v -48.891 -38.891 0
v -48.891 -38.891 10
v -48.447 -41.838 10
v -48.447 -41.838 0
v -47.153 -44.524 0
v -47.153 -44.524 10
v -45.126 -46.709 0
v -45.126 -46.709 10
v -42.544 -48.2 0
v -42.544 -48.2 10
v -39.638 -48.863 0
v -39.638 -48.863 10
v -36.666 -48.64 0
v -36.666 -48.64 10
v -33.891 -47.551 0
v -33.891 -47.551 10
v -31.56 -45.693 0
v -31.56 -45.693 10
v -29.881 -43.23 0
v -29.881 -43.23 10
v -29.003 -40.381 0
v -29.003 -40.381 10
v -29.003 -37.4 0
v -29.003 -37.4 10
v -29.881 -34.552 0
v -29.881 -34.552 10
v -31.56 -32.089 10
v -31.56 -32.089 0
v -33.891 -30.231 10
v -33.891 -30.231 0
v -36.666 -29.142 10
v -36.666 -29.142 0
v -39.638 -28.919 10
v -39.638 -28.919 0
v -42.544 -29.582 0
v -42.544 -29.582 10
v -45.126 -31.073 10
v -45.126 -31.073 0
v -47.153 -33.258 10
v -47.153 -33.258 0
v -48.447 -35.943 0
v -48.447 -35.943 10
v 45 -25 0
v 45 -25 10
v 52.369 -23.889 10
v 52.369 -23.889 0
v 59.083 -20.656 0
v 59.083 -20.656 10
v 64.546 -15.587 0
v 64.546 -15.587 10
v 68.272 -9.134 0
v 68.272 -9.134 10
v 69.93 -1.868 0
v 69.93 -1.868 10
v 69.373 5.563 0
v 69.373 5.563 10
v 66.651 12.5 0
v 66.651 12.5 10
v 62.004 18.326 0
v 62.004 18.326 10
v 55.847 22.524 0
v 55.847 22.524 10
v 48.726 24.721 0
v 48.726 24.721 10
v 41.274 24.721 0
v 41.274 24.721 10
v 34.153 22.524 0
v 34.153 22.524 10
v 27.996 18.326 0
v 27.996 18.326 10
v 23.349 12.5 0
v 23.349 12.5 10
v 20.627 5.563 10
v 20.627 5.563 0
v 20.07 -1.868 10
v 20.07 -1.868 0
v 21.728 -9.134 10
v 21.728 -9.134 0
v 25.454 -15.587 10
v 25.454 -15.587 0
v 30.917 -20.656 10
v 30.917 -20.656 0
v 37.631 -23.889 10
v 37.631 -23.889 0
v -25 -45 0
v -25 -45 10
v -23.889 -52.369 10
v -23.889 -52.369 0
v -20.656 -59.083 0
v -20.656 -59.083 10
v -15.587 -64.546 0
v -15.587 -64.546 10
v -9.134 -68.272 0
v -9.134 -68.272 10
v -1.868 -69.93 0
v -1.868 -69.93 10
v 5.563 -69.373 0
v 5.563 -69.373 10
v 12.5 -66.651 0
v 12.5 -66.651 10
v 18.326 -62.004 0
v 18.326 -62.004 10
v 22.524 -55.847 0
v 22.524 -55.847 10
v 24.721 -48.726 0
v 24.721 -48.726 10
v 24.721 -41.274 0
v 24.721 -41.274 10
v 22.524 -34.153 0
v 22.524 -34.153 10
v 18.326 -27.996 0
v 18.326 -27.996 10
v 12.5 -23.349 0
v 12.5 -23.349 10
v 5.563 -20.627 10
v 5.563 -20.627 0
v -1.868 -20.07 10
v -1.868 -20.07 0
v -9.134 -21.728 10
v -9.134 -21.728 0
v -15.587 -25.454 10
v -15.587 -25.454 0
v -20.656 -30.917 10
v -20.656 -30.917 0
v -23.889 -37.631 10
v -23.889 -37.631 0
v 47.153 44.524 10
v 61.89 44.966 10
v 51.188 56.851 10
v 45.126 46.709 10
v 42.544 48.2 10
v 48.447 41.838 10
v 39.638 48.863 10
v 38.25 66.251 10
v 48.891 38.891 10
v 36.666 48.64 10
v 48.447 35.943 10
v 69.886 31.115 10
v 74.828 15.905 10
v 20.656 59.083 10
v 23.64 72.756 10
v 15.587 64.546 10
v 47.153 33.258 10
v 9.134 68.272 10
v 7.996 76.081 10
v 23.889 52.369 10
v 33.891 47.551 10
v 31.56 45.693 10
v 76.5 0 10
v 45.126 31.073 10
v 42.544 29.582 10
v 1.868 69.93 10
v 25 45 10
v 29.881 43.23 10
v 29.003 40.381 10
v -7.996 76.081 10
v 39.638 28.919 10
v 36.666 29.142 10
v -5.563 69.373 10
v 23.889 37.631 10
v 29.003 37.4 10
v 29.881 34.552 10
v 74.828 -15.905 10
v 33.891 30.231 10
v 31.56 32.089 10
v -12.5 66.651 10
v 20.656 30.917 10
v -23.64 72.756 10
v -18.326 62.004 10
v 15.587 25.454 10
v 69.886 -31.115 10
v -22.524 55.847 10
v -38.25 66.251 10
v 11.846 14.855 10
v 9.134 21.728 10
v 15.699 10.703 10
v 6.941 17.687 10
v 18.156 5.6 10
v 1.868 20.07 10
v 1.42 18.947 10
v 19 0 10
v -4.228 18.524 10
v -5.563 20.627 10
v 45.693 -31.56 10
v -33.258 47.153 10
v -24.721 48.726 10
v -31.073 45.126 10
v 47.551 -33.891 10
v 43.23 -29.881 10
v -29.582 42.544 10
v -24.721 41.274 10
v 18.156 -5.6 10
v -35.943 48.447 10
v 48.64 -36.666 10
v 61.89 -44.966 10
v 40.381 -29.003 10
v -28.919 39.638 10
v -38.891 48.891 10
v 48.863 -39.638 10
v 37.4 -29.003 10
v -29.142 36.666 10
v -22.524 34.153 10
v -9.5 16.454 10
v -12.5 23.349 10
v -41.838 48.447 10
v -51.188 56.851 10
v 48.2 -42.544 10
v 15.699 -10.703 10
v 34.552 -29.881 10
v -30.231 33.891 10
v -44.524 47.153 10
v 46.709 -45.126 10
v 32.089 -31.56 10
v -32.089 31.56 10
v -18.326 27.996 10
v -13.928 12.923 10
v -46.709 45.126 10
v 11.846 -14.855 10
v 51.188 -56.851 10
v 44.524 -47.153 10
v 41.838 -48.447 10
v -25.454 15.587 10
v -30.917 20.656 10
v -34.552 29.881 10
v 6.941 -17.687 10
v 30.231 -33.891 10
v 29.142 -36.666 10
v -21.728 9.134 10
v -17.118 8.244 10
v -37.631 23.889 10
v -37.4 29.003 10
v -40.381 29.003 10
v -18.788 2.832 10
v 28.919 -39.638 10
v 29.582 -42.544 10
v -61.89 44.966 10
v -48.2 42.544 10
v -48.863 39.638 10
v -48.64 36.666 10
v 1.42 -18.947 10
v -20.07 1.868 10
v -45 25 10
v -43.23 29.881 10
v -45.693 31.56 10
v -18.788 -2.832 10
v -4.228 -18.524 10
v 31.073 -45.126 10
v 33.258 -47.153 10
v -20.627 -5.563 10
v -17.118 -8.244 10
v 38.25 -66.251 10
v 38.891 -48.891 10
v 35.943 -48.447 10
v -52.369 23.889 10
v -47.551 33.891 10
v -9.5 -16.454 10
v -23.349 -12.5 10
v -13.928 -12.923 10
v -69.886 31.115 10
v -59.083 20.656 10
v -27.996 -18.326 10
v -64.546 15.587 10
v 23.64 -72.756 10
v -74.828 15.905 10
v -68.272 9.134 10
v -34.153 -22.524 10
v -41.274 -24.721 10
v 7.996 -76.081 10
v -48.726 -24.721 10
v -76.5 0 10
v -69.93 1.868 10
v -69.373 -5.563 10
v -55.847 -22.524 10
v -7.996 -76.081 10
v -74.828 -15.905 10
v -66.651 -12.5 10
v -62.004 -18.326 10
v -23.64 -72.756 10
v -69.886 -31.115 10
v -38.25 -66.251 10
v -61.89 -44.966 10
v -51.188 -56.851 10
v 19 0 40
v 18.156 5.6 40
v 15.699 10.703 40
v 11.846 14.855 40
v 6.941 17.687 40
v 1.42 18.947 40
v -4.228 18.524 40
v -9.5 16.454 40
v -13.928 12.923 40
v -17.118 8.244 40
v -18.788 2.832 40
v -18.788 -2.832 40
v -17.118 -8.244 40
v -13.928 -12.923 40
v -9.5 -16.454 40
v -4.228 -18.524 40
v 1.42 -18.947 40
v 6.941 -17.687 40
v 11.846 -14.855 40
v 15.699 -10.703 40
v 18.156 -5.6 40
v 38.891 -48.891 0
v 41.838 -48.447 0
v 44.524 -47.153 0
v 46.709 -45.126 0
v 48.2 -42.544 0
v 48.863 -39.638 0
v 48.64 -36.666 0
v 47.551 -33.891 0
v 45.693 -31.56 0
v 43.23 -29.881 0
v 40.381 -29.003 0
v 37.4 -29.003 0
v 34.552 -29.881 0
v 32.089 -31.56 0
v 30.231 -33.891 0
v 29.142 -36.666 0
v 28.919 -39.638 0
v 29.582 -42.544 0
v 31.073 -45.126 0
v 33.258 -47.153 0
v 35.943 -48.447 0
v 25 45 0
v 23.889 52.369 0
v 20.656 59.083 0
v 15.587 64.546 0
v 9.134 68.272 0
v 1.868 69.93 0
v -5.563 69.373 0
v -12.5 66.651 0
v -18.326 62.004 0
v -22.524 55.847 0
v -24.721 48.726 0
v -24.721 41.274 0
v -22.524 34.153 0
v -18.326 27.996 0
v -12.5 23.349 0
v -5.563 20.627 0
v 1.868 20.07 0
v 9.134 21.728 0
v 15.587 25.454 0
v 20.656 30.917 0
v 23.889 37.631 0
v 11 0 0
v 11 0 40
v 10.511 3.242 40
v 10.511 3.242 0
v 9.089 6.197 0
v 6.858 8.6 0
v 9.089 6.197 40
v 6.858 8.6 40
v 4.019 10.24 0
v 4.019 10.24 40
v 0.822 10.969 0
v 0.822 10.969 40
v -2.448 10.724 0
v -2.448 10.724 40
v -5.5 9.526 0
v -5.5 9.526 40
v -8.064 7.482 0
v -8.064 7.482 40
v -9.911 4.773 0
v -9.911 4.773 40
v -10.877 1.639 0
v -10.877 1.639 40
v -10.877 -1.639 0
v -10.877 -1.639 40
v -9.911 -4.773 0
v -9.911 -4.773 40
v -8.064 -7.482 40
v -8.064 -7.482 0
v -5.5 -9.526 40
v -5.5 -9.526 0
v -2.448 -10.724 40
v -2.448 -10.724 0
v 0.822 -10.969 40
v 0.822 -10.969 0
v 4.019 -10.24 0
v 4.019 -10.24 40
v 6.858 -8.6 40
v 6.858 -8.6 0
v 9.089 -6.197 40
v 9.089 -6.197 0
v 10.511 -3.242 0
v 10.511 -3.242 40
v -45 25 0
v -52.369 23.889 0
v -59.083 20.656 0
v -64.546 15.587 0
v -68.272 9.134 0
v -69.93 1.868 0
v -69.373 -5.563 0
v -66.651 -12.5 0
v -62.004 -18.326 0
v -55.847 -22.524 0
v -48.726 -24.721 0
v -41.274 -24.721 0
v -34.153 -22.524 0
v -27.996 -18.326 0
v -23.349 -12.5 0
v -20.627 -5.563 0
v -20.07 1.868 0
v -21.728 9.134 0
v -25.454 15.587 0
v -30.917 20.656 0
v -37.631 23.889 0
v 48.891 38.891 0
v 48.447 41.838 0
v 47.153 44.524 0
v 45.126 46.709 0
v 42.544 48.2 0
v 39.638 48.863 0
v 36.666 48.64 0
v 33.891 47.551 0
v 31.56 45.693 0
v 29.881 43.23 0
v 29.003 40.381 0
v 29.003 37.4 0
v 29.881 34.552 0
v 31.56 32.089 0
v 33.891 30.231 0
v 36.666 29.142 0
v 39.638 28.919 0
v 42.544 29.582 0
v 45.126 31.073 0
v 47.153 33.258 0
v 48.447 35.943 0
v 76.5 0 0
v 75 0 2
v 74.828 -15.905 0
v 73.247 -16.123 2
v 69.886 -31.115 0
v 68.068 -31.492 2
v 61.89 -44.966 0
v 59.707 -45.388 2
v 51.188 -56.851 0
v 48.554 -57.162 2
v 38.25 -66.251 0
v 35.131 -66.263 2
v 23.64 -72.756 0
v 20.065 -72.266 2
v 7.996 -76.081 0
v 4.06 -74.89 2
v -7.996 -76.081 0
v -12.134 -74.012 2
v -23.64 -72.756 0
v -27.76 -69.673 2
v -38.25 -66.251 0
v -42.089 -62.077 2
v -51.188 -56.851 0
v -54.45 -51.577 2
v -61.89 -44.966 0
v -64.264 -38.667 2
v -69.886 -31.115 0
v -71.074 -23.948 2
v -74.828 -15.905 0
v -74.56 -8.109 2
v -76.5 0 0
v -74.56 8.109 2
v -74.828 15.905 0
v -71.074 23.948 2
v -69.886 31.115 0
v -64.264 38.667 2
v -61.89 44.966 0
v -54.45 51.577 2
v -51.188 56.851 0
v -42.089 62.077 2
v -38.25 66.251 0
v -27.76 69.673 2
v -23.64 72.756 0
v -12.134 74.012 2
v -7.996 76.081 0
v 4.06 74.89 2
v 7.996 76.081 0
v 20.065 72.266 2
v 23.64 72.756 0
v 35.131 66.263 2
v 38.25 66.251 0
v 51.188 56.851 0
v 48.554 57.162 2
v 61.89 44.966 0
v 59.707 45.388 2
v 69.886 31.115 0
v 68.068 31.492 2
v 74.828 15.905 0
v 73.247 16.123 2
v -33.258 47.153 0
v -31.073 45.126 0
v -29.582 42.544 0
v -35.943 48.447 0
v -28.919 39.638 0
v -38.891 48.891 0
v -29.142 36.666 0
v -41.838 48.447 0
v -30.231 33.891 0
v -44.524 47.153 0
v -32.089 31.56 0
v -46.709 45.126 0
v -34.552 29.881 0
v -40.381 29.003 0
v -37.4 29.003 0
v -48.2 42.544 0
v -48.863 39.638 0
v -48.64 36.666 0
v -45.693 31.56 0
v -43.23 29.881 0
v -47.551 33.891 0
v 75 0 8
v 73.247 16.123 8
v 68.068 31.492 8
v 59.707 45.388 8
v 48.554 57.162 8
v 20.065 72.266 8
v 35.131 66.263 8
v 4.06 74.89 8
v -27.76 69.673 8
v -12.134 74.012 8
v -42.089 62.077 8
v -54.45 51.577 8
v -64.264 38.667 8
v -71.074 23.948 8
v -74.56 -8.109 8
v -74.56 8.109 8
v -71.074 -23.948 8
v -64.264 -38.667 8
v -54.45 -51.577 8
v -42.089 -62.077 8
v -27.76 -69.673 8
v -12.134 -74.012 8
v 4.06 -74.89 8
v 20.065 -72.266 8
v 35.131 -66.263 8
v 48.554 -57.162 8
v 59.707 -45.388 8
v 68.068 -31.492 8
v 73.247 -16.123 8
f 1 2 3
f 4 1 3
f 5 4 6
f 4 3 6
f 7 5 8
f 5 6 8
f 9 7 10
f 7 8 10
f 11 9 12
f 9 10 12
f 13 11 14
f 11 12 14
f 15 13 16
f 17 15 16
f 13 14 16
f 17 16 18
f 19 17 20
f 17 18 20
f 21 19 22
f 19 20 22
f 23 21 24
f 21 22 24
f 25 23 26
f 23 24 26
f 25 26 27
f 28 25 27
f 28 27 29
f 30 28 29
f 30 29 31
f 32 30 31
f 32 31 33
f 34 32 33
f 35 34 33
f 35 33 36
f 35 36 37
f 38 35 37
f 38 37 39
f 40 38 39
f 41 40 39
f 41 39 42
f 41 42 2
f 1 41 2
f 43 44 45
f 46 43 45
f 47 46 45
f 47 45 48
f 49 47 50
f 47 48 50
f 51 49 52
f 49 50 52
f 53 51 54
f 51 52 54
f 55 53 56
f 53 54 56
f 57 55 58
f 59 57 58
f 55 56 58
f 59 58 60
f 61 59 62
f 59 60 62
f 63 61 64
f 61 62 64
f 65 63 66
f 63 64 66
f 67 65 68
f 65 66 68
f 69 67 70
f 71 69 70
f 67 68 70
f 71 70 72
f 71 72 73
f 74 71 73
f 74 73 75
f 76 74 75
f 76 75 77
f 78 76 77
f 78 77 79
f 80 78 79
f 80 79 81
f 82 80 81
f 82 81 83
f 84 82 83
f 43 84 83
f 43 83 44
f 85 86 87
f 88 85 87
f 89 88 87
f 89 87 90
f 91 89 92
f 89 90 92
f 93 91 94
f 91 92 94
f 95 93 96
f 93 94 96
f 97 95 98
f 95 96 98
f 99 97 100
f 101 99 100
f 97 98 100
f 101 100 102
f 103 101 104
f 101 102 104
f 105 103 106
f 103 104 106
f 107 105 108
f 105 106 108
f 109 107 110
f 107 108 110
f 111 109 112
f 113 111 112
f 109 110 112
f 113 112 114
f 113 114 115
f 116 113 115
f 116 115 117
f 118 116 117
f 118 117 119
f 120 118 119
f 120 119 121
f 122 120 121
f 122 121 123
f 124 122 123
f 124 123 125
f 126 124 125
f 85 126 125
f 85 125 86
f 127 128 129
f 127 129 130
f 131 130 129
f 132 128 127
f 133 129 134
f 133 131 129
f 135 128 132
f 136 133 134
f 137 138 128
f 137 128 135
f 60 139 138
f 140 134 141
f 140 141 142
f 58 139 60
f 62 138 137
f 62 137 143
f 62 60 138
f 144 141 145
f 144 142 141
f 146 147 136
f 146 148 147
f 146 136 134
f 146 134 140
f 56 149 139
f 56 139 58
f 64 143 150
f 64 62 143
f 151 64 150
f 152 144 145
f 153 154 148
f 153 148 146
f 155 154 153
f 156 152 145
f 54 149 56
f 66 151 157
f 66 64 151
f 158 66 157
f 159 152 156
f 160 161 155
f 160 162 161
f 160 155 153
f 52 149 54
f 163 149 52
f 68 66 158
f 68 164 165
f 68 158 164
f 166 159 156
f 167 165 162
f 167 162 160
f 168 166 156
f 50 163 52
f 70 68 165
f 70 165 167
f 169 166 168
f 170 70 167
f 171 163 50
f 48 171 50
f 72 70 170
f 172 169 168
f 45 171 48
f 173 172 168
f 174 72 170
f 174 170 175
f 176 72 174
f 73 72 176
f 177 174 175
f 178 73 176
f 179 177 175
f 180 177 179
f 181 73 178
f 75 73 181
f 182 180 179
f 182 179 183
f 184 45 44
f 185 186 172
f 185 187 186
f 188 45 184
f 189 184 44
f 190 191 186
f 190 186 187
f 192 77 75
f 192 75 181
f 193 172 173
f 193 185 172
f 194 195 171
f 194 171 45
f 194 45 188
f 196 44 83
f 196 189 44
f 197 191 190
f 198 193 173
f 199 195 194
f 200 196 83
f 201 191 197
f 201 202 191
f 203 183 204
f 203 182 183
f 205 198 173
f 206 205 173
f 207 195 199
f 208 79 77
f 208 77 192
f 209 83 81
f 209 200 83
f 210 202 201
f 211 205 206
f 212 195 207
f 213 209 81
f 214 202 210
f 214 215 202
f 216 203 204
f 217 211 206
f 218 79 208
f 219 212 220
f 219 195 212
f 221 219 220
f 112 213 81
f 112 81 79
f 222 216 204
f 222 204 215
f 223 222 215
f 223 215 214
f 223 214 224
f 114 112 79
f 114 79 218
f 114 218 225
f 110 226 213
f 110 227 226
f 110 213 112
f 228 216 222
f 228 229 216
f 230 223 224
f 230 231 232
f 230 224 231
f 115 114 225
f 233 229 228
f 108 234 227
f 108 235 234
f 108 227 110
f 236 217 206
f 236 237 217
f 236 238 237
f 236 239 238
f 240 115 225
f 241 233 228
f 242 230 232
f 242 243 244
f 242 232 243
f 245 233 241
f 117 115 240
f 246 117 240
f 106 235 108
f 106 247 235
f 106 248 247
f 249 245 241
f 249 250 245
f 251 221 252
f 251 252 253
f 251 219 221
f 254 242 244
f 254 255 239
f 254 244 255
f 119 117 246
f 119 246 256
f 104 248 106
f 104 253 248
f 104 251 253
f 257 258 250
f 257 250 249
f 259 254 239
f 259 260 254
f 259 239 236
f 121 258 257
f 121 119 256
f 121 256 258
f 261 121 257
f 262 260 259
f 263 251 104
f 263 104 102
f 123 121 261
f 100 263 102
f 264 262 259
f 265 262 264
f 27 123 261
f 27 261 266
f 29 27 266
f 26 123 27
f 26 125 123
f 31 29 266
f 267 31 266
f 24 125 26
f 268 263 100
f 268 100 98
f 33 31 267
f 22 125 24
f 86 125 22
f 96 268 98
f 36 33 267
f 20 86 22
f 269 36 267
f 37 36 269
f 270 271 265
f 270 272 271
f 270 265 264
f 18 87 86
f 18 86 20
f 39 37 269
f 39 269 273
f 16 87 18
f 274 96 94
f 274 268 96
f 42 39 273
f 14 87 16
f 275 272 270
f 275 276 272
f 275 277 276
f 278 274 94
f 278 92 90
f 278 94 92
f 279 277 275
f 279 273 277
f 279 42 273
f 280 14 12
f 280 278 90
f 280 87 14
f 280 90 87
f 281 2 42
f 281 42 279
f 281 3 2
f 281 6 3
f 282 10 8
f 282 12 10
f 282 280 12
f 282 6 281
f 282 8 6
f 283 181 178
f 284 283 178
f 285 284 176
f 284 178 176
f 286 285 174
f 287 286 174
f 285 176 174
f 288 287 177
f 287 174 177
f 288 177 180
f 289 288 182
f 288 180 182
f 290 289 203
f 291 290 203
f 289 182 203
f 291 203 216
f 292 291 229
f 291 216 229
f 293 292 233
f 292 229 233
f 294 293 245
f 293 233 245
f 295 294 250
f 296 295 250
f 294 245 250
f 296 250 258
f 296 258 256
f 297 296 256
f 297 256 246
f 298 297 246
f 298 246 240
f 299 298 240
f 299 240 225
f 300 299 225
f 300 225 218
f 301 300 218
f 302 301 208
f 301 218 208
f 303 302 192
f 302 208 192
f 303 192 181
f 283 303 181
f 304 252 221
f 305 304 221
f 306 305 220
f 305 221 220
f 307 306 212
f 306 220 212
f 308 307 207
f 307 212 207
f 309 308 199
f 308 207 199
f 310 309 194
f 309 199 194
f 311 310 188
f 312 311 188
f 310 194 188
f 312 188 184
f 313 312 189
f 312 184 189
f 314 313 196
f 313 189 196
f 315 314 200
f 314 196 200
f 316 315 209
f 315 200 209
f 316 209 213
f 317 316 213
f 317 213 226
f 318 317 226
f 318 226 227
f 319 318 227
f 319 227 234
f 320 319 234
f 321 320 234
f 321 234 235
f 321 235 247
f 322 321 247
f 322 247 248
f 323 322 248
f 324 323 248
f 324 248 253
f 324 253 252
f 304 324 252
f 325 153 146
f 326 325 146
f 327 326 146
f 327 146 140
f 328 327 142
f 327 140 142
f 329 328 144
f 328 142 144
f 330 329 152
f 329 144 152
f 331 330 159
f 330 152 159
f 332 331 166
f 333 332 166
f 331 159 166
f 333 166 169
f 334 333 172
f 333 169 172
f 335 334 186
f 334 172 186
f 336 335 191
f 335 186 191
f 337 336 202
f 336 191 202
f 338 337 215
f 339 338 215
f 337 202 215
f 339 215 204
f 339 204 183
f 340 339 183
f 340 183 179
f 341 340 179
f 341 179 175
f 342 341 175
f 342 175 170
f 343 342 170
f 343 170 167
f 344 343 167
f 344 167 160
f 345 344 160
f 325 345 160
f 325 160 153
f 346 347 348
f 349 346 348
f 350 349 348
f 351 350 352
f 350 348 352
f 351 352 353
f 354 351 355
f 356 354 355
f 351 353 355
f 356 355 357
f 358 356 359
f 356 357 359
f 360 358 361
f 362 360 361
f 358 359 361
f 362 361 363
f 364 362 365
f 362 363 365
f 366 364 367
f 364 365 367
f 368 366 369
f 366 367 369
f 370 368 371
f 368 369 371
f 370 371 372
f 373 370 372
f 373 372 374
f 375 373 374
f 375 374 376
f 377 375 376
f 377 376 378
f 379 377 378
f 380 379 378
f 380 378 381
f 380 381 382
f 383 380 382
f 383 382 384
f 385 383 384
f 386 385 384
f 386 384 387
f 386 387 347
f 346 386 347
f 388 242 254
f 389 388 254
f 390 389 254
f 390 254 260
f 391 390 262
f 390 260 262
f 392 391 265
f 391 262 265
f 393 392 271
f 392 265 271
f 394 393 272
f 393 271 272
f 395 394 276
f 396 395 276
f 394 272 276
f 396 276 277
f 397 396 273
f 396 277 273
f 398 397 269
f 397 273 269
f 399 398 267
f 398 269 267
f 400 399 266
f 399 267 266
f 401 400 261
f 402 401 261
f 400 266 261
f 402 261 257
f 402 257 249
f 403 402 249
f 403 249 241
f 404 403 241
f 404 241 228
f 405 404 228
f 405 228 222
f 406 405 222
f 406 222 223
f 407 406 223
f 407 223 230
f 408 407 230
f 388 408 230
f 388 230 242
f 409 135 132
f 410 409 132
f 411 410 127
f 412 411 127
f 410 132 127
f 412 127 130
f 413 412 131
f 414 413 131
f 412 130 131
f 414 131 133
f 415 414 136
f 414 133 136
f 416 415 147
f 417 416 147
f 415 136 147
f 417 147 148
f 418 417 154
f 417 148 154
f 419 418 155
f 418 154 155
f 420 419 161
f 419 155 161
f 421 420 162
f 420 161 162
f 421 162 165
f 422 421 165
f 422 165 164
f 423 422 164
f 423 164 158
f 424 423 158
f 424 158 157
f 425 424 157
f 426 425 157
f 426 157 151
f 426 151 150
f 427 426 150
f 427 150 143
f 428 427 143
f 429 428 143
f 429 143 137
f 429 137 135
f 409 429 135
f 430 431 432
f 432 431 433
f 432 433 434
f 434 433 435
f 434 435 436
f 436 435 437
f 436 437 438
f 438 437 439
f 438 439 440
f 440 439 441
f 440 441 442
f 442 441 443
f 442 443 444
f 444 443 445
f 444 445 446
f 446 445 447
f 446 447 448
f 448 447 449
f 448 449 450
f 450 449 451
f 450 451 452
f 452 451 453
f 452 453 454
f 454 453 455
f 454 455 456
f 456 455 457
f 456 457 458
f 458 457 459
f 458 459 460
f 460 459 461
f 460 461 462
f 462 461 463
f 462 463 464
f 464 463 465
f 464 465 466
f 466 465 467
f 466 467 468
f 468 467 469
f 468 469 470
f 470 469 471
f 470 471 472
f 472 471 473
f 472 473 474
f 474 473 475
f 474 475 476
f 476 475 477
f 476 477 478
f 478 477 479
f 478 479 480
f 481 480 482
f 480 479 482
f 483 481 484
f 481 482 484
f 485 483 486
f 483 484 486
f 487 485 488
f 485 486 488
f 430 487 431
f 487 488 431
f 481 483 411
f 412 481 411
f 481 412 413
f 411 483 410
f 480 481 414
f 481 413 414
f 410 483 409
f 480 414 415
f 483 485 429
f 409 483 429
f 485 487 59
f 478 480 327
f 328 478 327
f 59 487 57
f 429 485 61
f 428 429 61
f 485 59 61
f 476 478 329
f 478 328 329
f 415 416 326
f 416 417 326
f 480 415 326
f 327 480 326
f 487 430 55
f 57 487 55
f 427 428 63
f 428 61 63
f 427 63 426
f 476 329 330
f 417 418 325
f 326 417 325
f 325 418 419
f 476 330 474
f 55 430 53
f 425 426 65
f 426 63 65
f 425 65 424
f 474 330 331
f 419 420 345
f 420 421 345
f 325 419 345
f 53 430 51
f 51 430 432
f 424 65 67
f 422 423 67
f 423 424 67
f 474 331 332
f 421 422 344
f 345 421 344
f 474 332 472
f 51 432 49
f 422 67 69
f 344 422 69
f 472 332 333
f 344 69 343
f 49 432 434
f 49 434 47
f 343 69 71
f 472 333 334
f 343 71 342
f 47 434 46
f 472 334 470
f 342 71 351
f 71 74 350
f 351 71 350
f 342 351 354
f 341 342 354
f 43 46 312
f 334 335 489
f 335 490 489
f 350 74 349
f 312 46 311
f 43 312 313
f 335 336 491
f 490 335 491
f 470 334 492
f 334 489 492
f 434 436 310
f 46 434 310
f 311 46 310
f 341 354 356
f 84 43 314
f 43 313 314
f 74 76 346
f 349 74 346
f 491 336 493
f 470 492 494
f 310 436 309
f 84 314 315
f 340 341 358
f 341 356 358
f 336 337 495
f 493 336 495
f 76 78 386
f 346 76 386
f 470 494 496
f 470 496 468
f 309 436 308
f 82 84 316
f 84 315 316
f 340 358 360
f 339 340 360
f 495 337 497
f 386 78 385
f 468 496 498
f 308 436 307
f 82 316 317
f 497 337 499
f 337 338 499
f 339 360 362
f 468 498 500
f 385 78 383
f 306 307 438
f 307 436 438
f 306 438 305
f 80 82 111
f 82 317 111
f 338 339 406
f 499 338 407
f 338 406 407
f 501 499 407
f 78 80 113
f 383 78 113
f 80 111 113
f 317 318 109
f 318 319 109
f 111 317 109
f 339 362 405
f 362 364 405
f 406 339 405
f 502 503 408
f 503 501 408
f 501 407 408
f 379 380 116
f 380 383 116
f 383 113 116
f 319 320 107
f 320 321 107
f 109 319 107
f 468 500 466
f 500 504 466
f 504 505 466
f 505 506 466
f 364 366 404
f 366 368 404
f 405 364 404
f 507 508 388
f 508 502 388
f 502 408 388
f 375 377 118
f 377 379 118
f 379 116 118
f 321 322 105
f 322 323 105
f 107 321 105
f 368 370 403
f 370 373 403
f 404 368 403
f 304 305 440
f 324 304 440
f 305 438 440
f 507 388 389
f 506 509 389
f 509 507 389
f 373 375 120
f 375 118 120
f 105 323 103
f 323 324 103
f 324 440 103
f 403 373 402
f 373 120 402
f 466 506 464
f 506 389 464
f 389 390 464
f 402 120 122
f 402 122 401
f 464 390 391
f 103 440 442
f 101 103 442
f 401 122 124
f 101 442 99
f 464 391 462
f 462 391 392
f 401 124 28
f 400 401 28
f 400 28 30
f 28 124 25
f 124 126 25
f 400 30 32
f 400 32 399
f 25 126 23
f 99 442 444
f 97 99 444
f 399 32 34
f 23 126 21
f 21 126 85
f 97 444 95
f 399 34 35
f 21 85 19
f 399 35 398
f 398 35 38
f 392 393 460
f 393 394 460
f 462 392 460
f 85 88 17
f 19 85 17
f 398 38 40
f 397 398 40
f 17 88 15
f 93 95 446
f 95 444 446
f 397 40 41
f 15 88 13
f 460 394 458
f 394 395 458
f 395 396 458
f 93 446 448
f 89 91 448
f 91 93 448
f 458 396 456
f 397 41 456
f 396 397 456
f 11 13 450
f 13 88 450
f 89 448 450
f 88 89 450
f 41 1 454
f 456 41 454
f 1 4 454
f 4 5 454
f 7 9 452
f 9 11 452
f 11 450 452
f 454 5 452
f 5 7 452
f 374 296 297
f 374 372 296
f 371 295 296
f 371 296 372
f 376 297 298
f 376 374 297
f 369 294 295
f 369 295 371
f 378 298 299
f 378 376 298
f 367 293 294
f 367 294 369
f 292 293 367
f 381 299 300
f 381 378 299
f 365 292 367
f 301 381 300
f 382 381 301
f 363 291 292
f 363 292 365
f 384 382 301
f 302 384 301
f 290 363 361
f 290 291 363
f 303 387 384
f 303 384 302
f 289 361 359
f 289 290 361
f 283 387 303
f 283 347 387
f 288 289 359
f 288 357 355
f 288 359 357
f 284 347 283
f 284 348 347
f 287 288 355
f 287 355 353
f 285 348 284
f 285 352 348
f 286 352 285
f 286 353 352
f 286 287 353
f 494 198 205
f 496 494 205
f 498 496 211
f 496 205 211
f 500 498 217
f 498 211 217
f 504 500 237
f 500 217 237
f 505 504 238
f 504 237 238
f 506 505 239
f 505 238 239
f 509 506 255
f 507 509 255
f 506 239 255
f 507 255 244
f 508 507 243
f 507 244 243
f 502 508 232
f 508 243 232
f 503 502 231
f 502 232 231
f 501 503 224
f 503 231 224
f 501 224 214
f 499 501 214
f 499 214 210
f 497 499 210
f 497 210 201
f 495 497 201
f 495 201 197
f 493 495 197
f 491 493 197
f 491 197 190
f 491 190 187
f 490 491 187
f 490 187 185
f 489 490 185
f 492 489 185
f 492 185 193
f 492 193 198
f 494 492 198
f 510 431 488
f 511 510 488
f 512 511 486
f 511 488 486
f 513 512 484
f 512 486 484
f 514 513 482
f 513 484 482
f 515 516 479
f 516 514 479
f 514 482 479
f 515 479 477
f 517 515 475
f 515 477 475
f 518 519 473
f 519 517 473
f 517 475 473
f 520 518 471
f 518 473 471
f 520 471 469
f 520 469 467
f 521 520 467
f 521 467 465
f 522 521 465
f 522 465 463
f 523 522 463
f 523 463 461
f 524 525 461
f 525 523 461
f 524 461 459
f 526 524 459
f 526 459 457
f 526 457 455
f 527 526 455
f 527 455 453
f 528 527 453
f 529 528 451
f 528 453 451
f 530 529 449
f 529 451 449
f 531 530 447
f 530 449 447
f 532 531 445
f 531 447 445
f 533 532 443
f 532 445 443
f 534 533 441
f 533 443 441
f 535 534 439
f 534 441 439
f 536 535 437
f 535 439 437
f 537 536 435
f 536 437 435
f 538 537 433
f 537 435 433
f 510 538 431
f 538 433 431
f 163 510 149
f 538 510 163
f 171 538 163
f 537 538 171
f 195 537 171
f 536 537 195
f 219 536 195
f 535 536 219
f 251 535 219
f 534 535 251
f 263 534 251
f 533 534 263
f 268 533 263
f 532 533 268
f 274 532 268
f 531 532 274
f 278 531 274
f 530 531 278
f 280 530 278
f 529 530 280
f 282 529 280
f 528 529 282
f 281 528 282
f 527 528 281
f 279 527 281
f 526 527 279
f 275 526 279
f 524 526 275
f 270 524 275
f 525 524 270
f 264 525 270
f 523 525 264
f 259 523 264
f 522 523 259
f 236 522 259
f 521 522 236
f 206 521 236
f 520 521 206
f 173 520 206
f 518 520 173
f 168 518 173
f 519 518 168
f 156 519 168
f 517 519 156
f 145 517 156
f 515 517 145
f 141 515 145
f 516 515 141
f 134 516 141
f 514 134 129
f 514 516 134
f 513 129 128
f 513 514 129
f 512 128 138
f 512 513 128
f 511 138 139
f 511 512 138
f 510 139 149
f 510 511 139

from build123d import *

# Parameters (mm, degrees)
SKETCH1_R           = 75
BOSS_EXTRUDE1_DEPTH = 10
SKETCH2_R           = 19
BOSS_EXTRUDE2_DEPTH = 30
SKETCH3_R           = 11
CUT_EXTRUDE1_DEPTH  = 114.357840488
SKETCH5_R           = 25
CUT_EXTRUDE2_DEPTH  = 113.269764407
CIRPATTERN1_COUNT   = 4
SKETCH6_R           = 10
CUT_EXTRUDE3_DEPTH  = 113.269764407
CIRPATTERN2_COUNT   = 4


with BuildPart() as part:
    # Sketch1 → Boss-Extrude1 (new body)
    with BuildSketch(Plane.XY):
        Circle(SKETCH1_R)
    extrude(amount=BOSS_EXTRUDE1_DEPTH)

    # Sketch2 → Boss-Extrude2 (add)
    with BuildSketch(Plane.XY.offset(10)):
        Circle(SKETCH2_R)
    extrude(amount=BOSS_EXTRUDE2_DEPTH)

    # Sketch3 → Cut-Extrude1 (cut, through all)
    with BuildSketch(Plane.XY.offset(40)):
        Circle(SKETCH3_R)
    extrude(amount=-CUT_EXTRUDE1_DEPTH, mode=Mode.SUBTRACT)

    # Sketch4 → Revolve1 (revolve)
    with BuildSketch(Plane(origin=(0, 0, 0), x_dir=(1, 0, 0), z_dir=(0, 1, 0))):
        Polygon((75, 0), (76.5, 0), (75, -2), align=None)
        Polygon((75, -10), (76.5, -10), (75, -8), align=None)
    revolve(axis=Axis((0, 0, 40), (0, 0, -1)))

    # Sketch5 → Cut-Extrude2 (cut, through all)
    with BuildSketch(Plane.XY.offset(10)):
        with Locations((0, 45)):
            Circle(SKETCH5_R)
    cut_extrude2 = extrude(amount=-CUT_EXTRUDE2_DEPTH, mode=Mode.SUBTRACT)

    # CirPattern1: Cut-Extrude2 ×4 about axis
    cirpattern1_axis = Axis((0, 0, 0), (0, 0, 1))
    for i in range(1, CIRPATTERN1_COUNT):
        add(cut_extrude2.rotate(cirpattern1_axis, i * 360 / CIRPATTERN1_COUNT), mode=Mode.SUBTRACT)

    # Sketch6 → Cut-Extrude3 (cut, through all)
    with BuildSketch(Plane.XY.offset(10)):
        with Locations((38.890872965, 38.890872965)):
            Circle(SKETCH6_R)
    cut_extrude3 = extrude(amount=-CUT_EXTRUDE3_DEPTH, mode=Mode.SUBTRACT)

    # CirPattern2: Cut-Extrude3 ×4 about axis
    cirpattern2_axis = Axis((0, 0, 0), (0, 0, 1))
    for i in range(1, CIRPATTERN2_COUNT):
        add(cut_extrude3.rotate(cirpattern2_axis, i * 360 / CIRPATTERN2_COUNT), mode=Mode.SUBTRACT)


solid = part.part
